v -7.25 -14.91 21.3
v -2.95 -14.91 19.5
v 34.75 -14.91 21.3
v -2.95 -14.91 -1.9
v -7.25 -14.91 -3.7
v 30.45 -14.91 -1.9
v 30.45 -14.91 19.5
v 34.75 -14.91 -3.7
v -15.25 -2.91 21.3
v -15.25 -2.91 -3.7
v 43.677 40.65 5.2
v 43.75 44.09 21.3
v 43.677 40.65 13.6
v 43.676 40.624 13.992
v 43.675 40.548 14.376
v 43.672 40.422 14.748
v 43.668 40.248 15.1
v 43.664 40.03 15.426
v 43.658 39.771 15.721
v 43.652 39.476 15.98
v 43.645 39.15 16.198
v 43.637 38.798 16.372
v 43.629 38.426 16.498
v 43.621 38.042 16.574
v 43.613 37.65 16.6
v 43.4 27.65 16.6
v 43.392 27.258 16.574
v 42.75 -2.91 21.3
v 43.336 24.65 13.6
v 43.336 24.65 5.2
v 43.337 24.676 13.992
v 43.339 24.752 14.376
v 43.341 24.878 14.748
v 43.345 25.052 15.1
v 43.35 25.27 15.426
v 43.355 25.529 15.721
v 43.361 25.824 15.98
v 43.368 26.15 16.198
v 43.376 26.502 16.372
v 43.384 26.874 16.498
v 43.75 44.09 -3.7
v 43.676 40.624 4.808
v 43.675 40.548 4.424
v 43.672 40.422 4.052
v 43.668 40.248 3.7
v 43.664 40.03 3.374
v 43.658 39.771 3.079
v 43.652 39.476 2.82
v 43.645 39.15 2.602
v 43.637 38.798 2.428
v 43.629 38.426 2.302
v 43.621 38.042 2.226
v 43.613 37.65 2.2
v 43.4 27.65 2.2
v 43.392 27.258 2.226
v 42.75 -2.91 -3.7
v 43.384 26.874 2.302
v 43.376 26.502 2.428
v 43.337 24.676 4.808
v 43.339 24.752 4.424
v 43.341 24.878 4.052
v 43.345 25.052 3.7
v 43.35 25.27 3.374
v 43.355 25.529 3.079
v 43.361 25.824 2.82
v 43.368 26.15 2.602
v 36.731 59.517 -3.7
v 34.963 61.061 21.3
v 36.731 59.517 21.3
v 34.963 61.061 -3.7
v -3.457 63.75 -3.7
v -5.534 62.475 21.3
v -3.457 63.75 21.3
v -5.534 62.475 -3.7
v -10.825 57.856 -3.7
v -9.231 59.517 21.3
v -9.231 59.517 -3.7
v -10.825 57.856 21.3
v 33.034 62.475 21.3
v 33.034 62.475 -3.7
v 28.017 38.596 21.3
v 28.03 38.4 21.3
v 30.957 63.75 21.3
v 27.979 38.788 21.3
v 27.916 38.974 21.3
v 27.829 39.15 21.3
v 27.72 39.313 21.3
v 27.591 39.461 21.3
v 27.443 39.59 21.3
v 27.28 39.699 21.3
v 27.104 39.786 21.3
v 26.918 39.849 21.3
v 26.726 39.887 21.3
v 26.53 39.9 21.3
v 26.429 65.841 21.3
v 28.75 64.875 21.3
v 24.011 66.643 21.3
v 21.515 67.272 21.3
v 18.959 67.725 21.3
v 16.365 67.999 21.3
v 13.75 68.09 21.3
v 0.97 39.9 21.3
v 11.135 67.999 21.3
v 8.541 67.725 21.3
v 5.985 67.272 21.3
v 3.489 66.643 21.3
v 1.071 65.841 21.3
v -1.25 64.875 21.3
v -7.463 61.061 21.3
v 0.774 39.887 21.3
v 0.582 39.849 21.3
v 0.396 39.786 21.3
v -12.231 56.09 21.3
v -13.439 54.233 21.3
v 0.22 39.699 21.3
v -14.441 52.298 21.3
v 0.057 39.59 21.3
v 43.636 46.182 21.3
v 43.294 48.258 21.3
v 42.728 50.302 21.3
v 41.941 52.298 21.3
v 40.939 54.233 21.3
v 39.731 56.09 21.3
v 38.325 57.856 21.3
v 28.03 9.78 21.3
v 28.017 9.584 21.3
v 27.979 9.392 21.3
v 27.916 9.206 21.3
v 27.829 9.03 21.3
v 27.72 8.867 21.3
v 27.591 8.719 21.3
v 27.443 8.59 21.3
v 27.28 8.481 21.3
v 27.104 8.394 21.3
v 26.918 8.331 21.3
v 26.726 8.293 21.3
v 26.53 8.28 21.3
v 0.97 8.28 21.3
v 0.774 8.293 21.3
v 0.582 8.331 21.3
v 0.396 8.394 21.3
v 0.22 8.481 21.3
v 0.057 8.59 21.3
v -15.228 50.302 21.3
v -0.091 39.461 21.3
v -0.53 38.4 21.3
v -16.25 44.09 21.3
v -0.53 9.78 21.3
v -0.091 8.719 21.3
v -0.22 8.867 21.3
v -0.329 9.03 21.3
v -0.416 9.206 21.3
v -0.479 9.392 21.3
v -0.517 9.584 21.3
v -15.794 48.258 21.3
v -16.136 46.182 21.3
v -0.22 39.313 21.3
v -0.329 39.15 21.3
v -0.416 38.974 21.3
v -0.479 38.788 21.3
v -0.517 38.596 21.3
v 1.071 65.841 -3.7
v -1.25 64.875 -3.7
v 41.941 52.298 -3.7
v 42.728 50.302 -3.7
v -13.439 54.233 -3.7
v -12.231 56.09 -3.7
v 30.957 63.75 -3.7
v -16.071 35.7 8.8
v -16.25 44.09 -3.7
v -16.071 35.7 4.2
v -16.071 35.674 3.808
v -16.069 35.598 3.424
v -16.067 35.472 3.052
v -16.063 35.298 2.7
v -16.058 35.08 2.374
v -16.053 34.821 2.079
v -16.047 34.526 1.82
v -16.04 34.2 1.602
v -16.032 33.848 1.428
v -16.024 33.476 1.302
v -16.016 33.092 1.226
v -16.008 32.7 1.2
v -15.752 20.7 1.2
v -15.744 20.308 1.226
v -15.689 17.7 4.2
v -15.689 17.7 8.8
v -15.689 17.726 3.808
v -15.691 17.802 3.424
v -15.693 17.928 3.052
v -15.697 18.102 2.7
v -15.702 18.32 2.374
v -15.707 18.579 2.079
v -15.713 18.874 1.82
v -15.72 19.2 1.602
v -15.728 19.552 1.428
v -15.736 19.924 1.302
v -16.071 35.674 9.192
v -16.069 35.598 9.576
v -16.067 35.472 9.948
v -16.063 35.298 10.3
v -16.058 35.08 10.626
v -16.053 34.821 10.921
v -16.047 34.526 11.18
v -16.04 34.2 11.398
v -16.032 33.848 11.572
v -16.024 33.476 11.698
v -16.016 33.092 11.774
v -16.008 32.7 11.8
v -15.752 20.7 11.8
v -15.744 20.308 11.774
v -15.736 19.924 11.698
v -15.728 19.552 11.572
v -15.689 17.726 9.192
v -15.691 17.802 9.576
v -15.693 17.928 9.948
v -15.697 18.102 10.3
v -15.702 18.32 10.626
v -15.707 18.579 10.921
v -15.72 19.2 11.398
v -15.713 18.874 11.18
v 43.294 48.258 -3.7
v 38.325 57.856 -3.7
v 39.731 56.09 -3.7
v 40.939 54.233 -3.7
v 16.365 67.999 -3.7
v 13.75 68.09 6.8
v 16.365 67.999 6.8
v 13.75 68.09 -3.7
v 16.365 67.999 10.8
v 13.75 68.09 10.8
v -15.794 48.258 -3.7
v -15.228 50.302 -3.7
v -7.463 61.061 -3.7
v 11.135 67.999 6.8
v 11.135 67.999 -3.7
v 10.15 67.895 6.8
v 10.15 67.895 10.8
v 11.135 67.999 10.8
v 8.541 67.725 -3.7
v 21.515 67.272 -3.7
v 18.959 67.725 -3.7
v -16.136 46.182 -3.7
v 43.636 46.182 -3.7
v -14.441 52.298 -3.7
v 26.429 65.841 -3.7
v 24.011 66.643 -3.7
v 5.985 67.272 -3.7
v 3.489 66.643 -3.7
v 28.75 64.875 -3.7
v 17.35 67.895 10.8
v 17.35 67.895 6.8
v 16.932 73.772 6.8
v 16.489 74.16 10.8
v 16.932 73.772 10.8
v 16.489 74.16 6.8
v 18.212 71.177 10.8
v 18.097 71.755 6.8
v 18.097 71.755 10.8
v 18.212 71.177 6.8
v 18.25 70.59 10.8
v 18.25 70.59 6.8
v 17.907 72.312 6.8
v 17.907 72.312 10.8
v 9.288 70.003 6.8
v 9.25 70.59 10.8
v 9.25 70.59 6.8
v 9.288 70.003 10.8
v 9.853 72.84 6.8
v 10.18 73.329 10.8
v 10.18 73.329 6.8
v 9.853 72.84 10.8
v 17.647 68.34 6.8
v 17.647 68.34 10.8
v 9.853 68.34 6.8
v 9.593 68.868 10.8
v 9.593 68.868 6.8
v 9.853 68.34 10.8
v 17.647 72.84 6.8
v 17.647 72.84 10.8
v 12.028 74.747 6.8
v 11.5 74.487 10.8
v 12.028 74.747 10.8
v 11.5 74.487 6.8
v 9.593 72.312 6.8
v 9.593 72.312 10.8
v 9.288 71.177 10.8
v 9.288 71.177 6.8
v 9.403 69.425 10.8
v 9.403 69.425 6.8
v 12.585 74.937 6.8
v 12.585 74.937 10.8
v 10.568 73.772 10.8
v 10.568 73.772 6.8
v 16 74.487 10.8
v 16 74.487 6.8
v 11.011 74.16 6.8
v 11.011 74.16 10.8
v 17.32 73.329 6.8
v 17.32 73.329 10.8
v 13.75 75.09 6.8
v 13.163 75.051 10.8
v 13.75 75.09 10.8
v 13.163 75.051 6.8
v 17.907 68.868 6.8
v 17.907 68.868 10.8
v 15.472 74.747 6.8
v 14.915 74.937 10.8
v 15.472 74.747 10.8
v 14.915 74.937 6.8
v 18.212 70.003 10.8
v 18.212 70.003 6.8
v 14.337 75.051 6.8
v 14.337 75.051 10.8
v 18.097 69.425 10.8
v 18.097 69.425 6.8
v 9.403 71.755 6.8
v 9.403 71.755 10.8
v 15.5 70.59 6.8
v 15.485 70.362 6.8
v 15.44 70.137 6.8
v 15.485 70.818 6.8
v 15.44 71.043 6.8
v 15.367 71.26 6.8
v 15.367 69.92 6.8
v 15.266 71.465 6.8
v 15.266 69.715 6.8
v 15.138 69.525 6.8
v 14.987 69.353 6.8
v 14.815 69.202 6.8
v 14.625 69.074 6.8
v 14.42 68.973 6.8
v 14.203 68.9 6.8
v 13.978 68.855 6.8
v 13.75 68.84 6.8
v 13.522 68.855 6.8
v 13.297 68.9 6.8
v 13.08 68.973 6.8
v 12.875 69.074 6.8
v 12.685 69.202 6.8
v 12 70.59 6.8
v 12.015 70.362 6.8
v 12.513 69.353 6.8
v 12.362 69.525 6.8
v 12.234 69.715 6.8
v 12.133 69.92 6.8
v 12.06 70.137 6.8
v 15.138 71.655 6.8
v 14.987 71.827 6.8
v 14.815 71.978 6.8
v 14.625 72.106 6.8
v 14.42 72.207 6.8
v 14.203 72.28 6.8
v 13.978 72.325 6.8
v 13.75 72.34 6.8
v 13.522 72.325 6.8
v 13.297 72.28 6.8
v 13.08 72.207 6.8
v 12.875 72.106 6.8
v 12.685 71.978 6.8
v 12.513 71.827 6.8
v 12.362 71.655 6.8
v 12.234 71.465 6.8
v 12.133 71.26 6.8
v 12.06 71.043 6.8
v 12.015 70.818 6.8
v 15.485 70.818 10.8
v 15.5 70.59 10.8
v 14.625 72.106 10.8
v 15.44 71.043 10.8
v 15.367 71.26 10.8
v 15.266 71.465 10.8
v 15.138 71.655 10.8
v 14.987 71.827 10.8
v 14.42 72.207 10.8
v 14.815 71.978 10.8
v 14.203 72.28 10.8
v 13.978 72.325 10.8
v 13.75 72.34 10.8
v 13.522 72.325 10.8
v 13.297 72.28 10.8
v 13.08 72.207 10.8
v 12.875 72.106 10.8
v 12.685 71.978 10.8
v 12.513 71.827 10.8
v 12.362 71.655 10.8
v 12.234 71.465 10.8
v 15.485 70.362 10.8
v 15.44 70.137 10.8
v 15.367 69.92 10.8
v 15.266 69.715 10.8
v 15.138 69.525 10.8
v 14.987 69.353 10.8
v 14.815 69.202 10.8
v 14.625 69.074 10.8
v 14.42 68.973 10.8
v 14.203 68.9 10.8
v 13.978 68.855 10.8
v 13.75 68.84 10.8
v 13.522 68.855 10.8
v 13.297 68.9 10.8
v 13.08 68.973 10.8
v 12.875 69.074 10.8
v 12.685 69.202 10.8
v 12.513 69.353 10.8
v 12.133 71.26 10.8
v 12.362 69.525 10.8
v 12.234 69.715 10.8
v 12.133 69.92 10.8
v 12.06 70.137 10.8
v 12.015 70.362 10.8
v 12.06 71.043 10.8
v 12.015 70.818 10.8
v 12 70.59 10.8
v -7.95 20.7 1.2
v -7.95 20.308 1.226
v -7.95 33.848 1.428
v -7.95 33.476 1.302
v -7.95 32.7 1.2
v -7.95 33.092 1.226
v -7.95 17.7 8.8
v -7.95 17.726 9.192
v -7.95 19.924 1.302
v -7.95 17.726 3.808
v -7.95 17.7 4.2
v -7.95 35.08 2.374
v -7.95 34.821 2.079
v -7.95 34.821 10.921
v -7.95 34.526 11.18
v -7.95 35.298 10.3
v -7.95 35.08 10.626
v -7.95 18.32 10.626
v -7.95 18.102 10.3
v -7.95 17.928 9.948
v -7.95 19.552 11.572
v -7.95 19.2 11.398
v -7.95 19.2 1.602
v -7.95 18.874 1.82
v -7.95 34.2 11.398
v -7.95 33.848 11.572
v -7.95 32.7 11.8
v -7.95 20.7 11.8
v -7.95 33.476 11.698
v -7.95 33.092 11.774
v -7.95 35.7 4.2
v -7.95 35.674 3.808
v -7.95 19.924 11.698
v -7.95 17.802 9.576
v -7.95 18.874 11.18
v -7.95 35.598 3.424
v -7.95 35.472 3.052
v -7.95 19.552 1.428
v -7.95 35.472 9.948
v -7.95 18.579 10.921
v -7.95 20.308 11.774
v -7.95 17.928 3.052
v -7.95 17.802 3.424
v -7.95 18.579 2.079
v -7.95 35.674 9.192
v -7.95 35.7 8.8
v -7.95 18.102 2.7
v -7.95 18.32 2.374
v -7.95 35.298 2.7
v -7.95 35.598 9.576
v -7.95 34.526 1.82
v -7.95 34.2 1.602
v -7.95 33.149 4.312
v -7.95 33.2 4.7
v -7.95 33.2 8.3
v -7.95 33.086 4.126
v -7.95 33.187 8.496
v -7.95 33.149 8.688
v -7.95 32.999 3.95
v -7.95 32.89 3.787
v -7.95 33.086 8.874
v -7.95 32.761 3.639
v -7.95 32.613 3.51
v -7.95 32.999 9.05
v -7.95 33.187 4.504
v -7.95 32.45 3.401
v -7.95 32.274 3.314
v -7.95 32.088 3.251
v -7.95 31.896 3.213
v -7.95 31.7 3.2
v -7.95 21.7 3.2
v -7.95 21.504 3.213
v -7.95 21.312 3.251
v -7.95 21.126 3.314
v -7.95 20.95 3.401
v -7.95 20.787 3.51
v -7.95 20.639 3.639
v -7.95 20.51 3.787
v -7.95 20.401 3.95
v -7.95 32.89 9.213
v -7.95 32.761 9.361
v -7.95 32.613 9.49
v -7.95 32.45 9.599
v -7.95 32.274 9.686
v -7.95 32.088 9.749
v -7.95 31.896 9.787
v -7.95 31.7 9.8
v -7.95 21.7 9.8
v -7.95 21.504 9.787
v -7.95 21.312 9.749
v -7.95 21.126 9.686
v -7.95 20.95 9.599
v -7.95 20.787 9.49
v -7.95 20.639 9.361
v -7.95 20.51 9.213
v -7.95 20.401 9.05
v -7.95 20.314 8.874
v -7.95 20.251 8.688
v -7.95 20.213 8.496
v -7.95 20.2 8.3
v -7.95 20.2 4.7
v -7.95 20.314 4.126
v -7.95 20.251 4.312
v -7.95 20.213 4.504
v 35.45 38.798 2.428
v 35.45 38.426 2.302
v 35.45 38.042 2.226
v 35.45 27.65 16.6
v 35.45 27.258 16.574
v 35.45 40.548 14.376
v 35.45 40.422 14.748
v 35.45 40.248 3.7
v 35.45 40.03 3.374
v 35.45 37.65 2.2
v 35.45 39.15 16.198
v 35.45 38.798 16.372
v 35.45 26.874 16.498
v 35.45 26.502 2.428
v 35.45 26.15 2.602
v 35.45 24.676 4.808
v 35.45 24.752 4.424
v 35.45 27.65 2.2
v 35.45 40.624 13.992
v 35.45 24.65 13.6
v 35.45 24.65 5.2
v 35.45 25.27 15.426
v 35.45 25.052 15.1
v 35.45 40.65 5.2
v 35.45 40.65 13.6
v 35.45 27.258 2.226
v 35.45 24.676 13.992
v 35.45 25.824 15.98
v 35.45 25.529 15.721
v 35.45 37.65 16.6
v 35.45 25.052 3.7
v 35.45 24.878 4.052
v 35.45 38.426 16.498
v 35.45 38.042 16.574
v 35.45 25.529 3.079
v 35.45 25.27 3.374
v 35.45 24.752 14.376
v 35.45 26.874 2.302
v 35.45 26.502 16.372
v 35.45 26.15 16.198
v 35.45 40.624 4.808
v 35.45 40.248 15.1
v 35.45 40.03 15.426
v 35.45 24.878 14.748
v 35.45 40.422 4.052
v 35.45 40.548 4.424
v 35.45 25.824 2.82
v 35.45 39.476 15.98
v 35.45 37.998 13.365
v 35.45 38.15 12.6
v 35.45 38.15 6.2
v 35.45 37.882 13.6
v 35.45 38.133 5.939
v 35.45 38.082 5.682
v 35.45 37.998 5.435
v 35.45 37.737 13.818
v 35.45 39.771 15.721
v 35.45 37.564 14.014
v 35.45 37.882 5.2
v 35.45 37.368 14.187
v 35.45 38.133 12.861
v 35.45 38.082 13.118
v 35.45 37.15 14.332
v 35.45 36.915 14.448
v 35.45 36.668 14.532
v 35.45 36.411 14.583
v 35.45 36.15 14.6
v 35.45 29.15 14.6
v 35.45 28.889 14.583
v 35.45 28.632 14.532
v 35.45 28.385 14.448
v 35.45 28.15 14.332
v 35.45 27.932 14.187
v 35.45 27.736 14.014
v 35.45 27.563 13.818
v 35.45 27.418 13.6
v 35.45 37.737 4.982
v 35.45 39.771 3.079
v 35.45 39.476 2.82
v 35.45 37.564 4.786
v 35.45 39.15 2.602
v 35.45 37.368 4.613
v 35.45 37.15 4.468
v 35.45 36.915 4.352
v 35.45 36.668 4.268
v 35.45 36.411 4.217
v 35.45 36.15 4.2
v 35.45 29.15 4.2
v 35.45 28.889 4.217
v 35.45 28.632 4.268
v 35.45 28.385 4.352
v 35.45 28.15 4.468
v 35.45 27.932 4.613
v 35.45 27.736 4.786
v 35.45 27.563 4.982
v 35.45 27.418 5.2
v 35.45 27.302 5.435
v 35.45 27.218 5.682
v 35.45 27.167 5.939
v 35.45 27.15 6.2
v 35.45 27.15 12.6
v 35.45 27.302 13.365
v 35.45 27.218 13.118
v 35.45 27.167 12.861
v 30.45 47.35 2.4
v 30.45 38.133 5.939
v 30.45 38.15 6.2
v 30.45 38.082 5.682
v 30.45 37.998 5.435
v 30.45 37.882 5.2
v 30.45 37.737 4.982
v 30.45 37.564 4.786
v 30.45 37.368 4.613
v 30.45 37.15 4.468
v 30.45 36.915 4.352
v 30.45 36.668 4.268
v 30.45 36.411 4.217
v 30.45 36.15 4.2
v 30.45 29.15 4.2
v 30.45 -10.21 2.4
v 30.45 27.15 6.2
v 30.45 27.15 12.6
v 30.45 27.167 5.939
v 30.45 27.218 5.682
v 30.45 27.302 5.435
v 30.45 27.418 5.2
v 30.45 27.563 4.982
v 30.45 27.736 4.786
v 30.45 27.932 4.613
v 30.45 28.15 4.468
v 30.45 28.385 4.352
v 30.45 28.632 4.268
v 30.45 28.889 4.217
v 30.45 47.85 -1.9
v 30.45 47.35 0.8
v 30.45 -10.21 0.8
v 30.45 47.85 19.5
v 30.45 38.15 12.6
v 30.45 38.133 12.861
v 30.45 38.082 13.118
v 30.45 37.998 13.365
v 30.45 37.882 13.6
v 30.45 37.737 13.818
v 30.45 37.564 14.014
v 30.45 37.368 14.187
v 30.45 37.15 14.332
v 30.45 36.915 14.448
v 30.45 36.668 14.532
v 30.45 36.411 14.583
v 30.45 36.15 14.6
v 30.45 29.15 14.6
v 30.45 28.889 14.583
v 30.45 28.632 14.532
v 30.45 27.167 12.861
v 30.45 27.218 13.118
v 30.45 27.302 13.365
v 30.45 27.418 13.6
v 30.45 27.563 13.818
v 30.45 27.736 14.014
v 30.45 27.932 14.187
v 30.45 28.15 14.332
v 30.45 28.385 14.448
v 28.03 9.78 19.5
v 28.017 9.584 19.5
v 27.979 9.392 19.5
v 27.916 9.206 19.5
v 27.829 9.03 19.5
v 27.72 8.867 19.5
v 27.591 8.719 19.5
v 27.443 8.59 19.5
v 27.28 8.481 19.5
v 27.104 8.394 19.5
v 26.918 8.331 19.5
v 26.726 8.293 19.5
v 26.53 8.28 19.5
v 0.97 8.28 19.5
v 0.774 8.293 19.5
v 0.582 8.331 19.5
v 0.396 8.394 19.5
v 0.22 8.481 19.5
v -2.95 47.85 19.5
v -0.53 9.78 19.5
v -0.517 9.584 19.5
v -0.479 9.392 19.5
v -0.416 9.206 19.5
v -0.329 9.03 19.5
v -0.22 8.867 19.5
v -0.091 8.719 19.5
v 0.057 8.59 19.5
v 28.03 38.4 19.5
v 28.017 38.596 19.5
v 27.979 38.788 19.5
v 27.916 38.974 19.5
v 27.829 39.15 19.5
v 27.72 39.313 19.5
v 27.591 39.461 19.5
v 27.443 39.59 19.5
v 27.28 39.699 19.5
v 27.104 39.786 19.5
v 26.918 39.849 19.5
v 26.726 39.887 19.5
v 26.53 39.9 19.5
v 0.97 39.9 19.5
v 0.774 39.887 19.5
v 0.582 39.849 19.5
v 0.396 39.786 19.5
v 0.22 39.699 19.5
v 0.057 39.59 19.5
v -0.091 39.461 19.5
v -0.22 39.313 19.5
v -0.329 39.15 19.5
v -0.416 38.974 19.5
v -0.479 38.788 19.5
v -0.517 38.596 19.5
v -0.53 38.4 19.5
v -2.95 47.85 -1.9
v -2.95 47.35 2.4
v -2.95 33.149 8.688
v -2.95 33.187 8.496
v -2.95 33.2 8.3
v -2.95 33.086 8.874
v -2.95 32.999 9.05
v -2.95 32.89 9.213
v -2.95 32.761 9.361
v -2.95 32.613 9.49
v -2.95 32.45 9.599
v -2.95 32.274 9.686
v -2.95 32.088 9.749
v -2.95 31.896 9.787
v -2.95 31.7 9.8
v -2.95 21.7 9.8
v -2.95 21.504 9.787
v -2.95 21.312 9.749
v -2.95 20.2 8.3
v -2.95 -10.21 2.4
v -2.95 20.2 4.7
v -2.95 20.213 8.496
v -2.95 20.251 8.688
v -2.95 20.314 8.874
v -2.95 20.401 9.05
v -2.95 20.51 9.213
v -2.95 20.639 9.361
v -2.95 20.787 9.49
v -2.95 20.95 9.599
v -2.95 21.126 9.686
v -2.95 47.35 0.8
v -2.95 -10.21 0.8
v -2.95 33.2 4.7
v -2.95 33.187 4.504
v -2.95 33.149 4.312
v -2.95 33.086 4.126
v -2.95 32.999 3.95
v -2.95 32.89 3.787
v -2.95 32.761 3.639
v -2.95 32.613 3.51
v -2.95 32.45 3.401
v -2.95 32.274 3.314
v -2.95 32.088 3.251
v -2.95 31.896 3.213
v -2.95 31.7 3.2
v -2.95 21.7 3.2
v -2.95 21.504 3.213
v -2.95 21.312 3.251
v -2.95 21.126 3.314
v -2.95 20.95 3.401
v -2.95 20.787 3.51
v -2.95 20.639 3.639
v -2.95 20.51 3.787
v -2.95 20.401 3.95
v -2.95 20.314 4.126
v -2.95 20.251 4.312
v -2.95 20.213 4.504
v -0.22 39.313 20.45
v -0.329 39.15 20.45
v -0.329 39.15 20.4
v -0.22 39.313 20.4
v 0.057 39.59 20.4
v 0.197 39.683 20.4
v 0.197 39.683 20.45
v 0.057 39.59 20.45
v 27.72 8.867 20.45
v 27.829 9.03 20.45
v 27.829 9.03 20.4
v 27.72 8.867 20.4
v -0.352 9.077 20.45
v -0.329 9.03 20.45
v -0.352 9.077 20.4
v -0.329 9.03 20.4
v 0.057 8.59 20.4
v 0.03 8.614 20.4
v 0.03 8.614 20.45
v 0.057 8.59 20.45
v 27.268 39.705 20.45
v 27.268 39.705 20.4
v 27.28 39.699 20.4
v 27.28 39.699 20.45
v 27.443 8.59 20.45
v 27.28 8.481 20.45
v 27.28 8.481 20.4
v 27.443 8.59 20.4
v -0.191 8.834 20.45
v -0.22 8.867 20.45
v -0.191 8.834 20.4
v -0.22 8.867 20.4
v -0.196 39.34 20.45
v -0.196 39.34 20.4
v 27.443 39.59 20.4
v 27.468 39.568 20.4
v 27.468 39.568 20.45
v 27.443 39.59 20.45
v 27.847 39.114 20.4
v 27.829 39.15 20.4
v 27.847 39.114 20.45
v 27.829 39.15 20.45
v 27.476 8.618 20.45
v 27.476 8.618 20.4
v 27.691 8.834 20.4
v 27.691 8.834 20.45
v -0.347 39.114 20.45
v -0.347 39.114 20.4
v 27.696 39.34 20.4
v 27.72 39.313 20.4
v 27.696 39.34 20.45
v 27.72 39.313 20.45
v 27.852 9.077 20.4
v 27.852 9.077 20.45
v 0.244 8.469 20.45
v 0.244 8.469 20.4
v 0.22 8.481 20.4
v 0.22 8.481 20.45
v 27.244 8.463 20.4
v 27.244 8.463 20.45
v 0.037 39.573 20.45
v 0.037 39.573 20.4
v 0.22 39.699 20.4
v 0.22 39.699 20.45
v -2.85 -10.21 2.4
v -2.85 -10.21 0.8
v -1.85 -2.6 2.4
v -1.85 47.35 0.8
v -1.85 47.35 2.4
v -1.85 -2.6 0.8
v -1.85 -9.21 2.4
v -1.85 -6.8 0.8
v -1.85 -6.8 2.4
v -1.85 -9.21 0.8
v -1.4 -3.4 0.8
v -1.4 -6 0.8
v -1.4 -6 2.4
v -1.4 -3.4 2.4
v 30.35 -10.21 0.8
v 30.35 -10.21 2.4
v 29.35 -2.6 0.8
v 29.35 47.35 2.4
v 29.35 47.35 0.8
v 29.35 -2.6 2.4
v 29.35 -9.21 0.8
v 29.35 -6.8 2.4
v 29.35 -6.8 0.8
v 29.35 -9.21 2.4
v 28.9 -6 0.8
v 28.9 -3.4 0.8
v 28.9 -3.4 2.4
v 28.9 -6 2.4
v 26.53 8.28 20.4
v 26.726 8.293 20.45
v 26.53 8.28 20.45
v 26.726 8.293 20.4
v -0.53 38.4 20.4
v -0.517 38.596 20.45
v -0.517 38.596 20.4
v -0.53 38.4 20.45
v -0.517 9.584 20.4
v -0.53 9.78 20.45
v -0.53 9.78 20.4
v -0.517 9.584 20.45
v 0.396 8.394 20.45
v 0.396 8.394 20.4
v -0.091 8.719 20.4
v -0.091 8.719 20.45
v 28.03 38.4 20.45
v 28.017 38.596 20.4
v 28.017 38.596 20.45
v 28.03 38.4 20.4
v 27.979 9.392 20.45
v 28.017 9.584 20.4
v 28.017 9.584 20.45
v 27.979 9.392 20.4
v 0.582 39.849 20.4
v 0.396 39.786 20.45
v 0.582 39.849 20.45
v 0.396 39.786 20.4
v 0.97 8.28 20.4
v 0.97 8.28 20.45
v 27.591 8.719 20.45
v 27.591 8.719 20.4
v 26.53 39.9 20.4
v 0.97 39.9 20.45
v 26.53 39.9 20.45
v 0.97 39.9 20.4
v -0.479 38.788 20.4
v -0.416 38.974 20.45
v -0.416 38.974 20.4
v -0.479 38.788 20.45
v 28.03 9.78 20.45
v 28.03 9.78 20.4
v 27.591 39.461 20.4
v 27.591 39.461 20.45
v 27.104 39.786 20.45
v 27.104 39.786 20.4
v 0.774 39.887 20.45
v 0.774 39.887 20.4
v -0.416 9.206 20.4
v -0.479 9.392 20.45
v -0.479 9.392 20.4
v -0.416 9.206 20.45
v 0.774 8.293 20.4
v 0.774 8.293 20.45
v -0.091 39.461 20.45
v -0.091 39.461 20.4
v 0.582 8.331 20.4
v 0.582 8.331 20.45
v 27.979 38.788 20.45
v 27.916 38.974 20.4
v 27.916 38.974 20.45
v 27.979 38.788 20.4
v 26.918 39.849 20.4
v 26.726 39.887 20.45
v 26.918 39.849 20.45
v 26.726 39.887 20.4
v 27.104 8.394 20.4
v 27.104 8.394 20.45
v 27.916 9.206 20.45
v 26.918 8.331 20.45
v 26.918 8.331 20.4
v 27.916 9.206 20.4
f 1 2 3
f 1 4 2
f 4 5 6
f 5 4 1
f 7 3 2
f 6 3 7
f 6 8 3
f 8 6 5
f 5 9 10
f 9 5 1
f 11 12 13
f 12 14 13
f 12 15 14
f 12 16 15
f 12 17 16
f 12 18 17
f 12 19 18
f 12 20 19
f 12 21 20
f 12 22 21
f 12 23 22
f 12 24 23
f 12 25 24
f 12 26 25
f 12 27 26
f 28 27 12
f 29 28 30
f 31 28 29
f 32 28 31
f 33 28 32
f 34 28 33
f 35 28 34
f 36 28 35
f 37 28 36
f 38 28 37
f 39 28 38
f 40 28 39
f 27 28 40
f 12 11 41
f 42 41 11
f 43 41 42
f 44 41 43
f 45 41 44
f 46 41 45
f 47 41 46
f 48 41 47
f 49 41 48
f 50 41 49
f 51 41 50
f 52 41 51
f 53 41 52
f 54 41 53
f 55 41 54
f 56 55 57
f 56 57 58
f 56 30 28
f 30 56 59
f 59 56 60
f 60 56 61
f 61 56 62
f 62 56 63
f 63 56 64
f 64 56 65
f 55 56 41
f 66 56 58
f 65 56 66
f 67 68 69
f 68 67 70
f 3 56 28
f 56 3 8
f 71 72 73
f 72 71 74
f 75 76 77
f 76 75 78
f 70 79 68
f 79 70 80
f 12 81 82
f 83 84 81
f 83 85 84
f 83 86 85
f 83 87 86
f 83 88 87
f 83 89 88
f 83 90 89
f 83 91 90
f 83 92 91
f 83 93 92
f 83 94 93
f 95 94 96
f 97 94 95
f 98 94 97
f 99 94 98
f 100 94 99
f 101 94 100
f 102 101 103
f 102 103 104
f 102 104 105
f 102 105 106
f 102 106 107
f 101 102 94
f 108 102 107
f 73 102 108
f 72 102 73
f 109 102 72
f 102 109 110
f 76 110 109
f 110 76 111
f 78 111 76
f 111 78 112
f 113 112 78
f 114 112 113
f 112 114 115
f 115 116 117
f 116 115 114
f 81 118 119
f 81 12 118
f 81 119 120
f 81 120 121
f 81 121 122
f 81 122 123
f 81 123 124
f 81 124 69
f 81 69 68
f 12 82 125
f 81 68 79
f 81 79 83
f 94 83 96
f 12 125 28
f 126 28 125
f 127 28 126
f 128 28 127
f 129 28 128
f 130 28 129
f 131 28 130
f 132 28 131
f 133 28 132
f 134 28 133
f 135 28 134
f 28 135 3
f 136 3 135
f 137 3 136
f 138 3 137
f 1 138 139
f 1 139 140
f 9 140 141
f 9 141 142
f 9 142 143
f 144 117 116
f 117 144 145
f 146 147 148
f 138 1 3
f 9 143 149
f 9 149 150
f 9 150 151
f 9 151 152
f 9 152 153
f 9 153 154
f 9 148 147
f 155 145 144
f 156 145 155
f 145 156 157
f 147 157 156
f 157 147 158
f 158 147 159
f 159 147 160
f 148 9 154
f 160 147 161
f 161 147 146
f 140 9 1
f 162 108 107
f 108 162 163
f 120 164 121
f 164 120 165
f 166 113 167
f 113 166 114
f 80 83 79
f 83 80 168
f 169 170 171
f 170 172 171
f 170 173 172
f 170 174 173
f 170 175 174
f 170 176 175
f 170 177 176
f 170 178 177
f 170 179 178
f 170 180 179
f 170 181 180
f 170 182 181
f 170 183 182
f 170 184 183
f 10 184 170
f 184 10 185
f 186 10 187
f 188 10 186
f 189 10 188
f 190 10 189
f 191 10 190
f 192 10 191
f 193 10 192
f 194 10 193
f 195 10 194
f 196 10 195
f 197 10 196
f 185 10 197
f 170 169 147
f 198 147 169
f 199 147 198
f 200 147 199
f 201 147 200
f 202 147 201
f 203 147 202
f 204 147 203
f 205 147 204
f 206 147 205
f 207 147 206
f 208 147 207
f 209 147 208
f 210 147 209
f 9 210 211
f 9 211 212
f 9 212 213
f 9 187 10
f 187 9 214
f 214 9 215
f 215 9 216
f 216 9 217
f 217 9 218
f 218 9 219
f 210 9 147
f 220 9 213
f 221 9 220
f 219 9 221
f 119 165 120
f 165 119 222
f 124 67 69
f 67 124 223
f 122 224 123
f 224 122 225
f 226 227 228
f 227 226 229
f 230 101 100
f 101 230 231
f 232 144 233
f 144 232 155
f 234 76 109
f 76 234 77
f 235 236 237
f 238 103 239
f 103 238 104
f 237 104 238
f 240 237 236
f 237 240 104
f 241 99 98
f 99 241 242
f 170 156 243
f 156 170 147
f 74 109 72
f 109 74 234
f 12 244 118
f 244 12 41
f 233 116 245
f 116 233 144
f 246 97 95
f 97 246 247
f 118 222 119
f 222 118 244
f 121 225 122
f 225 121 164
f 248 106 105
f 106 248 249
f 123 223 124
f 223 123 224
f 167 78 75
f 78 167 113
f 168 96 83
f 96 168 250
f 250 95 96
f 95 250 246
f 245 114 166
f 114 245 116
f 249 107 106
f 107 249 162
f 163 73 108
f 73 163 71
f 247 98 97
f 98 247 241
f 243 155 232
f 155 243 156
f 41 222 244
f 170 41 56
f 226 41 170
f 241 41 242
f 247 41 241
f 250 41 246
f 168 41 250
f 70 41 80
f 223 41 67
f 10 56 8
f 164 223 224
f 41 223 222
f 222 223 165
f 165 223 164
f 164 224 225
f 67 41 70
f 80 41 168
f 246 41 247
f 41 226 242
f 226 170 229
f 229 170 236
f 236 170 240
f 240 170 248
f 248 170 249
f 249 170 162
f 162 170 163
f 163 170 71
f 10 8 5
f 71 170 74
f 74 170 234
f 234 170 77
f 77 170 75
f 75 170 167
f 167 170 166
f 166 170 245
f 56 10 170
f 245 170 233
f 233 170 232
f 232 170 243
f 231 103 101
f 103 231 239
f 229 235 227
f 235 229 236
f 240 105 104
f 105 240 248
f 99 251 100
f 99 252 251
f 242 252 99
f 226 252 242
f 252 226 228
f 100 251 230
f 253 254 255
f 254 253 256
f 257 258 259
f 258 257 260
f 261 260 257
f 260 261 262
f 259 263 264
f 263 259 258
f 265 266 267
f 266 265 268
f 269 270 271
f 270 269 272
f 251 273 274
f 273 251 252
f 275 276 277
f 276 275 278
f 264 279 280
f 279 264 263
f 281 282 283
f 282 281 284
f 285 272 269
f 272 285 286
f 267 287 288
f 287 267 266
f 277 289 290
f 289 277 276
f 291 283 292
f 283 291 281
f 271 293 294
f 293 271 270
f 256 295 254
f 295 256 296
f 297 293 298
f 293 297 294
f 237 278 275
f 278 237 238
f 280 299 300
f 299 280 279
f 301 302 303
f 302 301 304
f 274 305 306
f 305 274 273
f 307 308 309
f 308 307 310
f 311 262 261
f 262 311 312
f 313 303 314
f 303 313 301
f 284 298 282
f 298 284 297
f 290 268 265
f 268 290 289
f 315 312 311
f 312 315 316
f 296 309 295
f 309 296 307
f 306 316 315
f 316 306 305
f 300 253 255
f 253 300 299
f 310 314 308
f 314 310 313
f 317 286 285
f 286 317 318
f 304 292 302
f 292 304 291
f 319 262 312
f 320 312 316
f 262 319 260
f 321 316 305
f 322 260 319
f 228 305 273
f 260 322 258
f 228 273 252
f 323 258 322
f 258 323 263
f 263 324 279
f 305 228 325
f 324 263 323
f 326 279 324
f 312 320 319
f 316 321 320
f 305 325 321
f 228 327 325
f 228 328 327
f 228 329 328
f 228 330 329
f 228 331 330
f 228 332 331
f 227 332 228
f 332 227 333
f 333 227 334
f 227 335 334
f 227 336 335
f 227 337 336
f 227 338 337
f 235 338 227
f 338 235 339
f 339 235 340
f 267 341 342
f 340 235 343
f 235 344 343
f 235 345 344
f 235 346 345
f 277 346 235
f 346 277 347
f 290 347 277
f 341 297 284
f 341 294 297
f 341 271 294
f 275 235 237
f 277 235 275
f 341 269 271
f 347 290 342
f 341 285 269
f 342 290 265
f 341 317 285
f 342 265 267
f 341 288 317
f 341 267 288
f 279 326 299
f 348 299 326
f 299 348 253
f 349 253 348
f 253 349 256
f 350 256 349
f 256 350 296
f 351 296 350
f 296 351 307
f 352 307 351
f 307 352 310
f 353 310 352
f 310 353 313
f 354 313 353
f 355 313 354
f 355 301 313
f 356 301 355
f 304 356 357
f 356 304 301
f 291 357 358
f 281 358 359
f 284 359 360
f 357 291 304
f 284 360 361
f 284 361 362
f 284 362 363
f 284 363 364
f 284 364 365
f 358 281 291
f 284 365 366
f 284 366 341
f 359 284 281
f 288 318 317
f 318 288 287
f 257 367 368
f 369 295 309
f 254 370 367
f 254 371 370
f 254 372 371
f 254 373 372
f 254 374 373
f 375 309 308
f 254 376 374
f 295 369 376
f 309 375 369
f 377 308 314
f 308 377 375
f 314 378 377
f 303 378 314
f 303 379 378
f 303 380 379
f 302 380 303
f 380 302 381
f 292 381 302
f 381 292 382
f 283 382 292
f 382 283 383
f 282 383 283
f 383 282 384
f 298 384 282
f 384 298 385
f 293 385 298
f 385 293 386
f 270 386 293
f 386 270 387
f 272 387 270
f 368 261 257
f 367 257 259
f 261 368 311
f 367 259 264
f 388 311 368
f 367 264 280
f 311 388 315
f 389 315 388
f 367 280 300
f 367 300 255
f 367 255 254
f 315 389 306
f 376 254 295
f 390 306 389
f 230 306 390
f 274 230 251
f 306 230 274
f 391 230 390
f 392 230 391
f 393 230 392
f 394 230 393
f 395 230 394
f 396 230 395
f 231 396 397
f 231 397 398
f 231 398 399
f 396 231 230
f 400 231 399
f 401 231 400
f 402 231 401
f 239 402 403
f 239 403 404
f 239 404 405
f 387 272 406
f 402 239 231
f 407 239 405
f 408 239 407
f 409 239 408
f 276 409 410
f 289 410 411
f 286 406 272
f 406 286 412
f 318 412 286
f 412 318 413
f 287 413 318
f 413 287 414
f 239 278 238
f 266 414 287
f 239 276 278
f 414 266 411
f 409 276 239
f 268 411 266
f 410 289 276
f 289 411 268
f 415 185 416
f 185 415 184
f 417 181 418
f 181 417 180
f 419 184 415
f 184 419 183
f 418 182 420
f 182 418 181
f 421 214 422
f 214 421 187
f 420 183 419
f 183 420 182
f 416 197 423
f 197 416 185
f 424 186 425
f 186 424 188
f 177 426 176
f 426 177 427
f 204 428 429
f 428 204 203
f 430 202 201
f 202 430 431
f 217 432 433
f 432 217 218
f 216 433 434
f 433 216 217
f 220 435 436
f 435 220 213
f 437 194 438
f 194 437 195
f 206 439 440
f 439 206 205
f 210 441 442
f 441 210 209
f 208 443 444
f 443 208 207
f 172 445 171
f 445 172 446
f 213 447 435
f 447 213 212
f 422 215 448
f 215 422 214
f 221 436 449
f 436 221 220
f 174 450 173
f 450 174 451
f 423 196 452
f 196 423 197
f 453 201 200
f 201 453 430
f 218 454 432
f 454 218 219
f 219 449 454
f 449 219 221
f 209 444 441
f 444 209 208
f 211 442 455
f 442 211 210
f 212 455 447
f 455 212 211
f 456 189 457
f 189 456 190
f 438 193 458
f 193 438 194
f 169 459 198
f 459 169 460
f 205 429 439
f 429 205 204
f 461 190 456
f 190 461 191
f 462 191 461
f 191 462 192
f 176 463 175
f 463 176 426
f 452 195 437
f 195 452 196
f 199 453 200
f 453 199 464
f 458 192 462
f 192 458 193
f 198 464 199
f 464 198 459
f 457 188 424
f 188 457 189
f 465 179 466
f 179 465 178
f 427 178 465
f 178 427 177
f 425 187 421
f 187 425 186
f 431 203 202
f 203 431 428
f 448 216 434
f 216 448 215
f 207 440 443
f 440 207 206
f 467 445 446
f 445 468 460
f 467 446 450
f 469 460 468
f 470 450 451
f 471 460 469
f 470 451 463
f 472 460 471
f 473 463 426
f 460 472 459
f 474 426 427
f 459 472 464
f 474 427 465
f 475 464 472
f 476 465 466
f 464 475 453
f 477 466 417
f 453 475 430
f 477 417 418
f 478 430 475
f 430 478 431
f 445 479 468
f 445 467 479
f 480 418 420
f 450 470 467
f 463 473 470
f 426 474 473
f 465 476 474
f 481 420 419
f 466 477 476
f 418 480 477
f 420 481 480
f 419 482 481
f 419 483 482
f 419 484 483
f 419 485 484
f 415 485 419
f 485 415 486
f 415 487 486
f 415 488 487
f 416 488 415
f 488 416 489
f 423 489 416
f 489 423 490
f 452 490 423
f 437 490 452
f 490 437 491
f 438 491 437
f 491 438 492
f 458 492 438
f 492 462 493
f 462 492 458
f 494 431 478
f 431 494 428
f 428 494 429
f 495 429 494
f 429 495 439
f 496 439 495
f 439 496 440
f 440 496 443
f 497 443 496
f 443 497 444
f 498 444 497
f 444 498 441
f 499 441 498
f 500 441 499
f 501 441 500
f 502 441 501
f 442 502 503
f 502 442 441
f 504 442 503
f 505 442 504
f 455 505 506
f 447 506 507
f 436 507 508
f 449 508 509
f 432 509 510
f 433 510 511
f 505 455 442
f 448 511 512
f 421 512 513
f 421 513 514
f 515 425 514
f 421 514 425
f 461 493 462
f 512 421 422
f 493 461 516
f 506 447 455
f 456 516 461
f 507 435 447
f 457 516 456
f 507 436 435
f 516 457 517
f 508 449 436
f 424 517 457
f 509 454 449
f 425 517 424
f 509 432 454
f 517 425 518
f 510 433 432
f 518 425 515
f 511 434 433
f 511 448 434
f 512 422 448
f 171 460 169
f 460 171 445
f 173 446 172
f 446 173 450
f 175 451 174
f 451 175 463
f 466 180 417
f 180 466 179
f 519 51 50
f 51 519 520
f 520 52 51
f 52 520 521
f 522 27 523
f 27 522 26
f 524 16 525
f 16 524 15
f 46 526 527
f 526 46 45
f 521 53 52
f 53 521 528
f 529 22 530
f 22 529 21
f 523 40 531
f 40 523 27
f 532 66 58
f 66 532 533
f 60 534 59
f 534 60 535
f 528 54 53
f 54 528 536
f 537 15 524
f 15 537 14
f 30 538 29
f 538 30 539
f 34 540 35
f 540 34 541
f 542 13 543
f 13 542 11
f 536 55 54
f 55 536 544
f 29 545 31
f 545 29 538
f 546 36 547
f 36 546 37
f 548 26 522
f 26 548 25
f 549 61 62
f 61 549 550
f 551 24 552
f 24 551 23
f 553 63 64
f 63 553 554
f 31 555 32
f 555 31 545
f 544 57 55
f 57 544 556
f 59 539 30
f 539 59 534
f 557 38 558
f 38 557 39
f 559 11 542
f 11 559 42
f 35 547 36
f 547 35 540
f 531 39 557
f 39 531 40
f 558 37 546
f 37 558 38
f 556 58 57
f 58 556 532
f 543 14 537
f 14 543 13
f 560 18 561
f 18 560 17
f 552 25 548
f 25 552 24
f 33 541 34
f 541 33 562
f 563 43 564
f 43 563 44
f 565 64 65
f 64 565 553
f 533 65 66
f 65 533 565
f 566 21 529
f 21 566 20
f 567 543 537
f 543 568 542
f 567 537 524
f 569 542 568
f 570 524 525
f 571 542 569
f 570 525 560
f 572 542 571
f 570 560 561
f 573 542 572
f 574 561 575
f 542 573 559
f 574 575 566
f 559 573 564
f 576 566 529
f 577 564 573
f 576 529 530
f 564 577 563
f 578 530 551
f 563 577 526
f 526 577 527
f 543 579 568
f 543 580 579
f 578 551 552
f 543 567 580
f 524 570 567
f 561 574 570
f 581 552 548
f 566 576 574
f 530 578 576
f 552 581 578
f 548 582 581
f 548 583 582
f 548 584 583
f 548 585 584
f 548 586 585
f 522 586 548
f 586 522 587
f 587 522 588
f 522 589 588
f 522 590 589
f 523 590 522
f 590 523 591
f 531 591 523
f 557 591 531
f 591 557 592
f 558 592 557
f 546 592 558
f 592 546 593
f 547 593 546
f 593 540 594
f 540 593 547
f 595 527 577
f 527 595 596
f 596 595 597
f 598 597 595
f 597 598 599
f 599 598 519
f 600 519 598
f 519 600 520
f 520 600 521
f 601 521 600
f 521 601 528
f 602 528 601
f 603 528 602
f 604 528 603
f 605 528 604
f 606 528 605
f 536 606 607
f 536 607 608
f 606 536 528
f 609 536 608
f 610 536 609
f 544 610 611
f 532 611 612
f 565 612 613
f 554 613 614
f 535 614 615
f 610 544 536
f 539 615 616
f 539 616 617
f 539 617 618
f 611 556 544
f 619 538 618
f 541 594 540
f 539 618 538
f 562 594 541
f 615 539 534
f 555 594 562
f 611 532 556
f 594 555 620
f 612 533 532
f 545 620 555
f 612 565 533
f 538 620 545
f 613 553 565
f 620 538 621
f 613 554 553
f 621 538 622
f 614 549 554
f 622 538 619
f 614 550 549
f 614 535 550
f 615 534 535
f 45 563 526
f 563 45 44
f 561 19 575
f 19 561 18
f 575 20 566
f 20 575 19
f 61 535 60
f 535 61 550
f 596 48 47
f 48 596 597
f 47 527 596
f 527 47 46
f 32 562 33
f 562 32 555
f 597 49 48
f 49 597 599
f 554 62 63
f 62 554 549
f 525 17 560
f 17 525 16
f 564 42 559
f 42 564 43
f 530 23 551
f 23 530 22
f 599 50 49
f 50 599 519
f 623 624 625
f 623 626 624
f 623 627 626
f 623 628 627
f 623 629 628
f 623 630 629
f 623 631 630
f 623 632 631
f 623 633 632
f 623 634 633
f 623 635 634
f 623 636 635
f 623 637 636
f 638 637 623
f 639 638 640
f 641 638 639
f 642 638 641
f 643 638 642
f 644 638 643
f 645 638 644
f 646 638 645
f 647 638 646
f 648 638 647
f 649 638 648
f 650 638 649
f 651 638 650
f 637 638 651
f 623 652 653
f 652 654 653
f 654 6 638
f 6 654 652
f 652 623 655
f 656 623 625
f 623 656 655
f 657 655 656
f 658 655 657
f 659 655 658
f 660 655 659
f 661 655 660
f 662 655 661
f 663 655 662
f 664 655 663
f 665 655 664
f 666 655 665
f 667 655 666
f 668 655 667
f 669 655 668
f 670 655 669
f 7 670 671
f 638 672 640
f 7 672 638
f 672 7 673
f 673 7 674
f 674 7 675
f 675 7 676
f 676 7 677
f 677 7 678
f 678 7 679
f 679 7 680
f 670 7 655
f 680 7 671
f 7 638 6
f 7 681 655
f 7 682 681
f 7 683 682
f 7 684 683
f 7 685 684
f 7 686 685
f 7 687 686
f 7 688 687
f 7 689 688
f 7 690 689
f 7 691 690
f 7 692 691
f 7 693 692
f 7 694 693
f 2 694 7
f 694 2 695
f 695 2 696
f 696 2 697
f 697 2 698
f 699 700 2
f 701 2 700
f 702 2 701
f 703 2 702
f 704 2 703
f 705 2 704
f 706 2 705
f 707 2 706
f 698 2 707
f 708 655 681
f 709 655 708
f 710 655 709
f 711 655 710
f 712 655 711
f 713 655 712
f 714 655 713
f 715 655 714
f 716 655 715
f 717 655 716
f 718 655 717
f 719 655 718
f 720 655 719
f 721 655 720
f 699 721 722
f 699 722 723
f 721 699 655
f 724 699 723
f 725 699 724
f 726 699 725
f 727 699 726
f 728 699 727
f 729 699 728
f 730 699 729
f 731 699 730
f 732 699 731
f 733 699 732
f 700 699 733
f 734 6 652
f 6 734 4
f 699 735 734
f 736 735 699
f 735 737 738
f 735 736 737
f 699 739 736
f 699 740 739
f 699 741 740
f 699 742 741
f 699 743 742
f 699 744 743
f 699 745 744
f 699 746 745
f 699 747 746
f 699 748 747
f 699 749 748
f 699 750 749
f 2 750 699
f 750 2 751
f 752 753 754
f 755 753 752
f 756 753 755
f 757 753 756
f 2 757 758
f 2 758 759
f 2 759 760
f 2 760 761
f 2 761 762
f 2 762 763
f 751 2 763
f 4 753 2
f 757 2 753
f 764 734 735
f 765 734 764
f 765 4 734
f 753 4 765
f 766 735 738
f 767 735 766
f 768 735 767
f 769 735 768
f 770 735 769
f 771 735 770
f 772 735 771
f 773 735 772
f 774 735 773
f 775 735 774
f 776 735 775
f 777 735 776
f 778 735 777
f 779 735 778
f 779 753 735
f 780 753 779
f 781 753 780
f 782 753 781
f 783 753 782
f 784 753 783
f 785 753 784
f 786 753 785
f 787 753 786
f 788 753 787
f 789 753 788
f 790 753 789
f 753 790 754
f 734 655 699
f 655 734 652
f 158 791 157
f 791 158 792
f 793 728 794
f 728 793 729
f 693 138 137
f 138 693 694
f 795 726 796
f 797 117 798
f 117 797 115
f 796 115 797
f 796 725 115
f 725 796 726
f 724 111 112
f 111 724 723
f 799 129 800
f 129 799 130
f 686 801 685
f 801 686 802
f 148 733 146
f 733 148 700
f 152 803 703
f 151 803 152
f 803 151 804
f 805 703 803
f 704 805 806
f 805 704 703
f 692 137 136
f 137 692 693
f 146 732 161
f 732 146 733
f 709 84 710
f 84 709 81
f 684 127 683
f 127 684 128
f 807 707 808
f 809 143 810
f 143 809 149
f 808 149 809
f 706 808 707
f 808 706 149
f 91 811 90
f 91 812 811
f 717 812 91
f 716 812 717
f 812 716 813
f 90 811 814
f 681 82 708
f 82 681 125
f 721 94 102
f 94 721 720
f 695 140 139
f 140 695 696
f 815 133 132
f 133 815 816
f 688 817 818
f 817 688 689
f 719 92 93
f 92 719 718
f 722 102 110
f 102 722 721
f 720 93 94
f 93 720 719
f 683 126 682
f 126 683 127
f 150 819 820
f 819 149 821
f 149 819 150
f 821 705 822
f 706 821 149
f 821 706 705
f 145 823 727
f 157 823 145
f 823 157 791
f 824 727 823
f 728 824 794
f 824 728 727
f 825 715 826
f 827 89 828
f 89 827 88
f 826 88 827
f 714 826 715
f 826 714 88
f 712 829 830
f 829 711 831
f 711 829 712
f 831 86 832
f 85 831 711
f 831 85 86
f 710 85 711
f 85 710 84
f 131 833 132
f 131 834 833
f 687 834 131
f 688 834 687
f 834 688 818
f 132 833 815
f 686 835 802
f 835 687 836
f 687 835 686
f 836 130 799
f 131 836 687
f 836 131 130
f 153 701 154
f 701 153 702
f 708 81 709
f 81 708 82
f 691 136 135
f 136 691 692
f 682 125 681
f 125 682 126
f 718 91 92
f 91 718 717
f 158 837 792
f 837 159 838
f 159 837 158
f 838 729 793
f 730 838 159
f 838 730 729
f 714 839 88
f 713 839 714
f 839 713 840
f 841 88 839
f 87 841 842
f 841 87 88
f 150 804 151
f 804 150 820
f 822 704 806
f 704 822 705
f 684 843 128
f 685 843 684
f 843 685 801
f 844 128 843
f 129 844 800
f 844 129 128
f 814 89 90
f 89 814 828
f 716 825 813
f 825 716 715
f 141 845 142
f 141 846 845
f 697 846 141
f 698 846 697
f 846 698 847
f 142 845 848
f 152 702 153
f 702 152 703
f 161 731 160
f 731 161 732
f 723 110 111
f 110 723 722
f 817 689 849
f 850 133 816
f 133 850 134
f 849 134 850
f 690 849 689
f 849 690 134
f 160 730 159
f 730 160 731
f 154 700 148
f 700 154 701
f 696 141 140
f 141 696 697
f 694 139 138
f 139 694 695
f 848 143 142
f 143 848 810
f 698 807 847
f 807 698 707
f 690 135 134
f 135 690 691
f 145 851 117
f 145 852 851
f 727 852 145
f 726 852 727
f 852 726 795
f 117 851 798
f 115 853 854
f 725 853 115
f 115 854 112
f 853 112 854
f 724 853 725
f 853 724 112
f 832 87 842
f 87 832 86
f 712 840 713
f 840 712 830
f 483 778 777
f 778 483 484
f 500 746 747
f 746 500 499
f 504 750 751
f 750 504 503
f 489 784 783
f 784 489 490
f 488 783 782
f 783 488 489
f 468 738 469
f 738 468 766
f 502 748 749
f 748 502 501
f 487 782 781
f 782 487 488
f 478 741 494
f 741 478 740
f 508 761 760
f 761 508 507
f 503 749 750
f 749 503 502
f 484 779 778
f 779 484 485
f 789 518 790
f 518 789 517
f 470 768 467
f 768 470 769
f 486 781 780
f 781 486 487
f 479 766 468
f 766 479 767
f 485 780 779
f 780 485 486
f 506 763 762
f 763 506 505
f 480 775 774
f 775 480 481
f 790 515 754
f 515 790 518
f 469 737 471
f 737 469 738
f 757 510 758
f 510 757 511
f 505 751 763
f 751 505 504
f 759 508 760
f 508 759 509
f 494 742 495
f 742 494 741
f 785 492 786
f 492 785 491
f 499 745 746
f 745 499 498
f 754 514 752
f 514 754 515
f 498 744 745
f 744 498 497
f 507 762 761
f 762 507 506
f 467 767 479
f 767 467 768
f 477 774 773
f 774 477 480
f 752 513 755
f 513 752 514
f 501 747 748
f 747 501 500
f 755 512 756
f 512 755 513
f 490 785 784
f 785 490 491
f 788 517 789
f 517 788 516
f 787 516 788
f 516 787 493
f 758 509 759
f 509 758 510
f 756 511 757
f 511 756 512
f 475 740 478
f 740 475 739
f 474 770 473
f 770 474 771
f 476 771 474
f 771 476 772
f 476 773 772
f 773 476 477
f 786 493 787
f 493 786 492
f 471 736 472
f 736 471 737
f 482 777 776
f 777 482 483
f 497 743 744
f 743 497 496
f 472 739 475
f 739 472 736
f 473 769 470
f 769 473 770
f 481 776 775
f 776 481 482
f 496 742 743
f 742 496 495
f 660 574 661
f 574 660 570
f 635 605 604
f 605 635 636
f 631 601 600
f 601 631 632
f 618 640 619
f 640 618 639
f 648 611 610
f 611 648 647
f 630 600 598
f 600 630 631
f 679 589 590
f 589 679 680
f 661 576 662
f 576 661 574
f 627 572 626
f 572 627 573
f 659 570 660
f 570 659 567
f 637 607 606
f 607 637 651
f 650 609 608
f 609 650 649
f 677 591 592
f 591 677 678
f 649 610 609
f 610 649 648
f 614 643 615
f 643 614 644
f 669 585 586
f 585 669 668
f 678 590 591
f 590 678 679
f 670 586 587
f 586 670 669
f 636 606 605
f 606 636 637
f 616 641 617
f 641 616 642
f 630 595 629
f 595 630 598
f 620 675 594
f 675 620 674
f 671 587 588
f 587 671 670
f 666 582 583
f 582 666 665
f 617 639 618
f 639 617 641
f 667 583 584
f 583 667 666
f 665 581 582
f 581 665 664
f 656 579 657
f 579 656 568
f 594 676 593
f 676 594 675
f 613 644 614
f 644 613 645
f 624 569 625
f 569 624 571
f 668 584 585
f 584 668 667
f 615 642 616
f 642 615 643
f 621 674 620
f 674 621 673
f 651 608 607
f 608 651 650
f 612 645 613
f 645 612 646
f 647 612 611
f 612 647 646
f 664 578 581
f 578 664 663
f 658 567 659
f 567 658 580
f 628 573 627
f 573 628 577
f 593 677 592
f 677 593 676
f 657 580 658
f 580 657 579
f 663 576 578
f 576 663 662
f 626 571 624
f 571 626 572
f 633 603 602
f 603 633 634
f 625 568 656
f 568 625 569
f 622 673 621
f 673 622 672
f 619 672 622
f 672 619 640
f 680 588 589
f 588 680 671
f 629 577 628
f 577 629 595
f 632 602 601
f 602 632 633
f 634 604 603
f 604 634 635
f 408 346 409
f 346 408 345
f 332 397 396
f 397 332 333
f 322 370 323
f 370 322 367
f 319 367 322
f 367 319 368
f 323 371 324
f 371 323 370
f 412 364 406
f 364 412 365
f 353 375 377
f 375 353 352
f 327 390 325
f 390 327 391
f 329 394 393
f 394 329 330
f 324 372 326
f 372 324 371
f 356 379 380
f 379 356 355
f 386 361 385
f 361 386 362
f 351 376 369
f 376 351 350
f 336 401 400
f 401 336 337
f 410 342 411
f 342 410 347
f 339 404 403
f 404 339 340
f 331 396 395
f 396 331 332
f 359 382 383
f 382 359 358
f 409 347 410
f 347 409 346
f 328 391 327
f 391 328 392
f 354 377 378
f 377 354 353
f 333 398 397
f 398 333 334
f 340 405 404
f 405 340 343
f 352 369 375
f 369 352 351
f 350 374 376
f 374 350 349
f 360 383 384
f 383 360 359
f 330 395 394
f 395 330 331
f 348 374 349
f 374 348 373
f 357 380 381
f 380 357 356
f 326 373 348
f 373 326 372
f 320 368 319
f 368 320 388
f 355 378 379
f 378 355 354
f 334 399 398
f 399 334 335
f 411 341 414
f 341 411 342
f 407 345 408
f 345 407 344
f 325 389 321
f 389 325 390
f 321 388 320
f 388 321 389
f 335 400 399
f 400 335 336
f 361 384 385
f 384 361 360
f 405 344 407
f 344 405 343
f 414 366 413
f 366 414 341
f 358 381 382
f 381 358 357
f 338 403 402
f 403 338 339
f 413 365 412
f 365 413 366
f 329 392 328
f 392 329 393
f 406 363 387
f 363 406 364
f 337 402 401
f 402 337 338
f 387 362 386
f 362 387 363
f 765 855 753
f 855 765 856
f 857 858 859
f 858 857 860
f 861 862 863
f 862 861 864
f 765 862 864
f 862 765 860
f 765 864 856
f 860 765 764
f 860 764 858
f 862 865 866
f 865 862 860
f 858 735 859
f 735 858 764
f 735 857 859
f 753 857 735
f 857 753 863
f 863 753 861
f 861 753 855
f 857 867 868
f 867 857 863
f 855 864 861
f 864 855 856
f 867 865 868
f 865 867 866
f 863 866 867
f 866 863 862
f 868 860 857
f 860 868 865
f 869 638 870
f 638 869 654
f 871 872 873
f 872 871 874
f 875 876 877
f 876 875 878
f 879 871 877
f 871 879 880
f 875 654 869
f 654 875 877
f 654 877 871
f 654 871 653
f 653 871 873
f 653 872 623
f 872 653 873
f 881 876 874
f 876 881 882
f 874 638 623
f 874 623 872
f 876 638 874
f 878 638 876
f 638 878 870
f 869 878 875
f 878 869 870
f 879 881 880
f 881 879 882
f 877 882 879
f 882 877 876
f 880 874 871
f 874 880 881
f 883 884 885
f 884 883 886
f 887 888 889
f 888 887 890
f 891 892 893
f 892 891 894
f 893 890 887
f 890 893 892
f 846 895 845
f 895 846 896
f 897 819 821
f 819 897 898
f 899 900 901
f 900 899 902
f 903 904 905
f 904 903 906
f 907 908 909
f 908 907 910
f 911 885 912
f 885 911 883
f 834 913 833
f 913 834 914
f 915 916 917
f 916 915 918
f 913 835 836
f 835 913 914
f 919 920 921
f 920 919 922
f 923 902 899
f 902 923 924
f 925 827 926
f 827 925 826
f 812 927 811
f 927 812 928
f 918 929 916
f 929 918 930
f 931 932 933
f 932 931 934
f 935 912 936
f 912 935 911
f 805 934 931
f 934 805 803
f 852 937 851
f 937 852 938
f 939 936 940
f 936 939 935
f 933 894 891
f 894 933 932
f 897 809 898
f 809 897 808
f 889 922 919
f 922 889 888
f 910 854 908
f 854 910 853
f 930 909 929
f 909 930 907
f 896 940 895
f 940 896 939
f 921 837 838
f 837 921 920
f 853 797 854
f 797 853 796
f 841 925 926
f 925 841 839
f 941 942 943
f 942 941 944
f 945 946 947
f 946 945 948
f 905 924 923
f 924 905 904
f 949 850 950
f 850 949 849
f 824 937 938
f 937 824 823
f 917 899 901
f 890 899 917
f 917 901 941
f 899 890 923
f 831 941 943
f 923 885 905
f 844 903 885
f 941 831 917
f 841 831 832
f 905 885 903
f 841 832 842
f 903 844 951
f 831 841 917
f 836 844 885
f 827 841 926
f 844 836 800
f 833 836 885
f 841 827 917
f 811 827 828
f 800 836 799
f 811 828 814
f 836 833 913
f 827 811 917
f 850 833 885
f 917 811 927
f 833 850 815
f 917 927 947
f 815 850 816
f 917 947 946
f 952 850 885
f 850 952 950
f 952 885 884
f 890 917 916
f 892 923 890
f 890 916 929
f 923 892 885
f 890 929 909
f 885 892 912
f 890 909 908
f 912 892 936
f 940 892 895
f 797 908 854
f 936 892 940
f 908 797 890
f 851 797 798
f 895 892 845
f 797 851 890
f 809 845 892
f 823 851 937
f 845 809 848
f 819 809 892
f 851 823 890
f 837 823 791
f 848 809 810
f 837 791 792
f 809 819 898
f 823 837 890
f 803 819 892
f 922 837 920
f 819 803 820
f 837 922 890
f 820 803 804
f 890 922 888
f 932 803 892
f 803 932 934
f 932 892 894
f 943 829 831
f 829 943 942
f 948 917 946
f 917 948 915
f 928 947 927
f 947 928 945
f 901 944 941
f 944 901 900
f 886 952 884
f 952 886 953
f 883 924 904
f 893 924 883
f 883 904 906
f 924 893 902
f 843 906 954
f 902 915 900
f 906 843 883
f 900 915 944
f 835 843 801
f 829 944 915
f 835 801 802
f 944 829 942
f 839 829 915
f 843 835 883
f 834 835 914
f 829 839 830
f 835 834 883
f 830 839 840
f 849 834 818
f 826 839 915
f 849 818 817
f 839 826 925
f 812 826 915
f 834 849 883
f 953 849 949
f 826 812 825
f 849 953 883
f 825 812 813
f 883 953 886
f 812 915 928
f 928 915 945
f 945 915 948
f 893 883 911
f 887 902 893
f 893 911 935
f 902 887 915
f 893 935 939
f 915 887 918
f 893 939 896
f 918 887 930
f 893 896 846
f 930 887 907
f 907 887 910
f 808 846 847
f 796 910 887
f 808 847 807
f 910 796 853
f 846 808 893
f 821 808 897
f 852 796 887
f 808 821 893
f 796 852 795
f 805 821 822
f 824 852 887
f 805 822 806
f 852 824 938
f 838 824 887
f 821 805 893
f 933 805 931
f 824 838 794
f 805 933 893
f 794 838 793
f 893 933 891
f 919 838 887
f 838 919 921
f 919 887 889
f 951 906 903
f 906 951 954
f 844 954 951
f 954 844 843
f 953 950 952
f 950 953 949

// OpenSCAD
// file: xmas_orn_case.scad
// Forward archived designs to the unchanged shared core one directory above.
include <../xmas_orn_case.scad>
// main file
// Iron Man revision 4: simplified 2008 Mark III helmet.
// Narrow horizontal lenses, broad faceplate, plain red shell; no bust or facial linework.
// V1-V3 remain untouched. Mechanical interface comes from the common core.
// part: ironman_v4 | body/gold/black/white[_print] | check_core/colours/backing
include <xmas_orn_case.scad>
part = "ironman_v4";
preview_display = true;
im_cx = (glass_x0 + glass_x1)/2;
im_cy = (glass_y0 + glass_y1)/2 - 4;
im_bottom = -35;
im_top = 48;
im_inlay = 0.8;
im_names = ["body", "gold", "black", "white"];
im_colours = ["#a51c2c", "#d9ae57", "#171b23", "#e9faff"];

module im_pair() { children(); mirror([1,0,0]) children(); }
module im_window() translate([0,4]) offset(r = 1.5)
    square([glass_w+2*front_win_margin-3, glass_l+2*front_win_margin-3], center = true);
module im_outline() polygon(concat(
    [for (a = [0:5:180]) [30*cos(a),24+24*sin(a)]],
    [[-29,-23],[-21,-35],[21,-35],[29,-23]]));

// The forehead notch and cut-back cheek plates define the helmet without drawn features.
module im_faceplate() polygon([
    [-6,44],[-5,38],[5,38],[6,44],[13,42],[21,37],[25,30],
    [26,12],[25,3],[21,-6],[18,-20],[16,-26],[12,-21],
    [-12,-21],[-16,-26],[-18,-20],[-21,-6],[-25,3],[-26,12],
    [-25,30],[-21,37],[-13,42]]);
module im_eyes() im_pair() polygon([
    [-24,27.4],[-6,27.4],[-7,25.2],[-23.4,24.8]]);
module im_gold() {
    im_faceplate();
    // Separate lower jaw plate, with the small red centre notch of the early helmet.
    polygon([[-18,-27],[-16,-27.2],[-11.5,-22.2],[11.5,-22.2],[16,-27.2],[18,-27],
             [20,-30],[16,-33],[11,-28],[4,-27],[3,-24.8],[-3,-24.8],
             [-4,-27],[-11,-28],[-16,-33],[-20,-30]]);
}
module im_black() {
    offset(delta = 0.65) im_eyes();
    // One plate separation, not a drawn mouth or multiple facial creases.
    polygon([[-16,-26],[-12,-21],[12,-21],[16,-26],
             [16,-27.2],[11.5,-22.2],[-11.5,-22.2],[-16,-27.2]]);
}
module im_white() im_eyes();

module im_raw(c) {
    if (c == 1) im_gold();
    if (c == 2) im_black();
    if (c == 3) im_white();
}
module im_ink(c) difference() {
    intersection() { im_outline(); im_raw(c); }
    if (c < 3) for (k = [c+1:3]) im_raw(k);
}
module im_body() {
    difference() {
        union() {
            translate([im_cx,im_cy,sz0]) linear_extrude(sz1-sz0) im_outline();
            hang_loop(im_cx,im_cy+im_top);
        }
        hang_loop_hole(im_cx,im_cy+im_top);
        sleeve_cuts(ext = 40, finger = true);
        translate([im_cx,im_cy,sz1-im_inlay]) linear_extrude(im_inlay+eps)
            for (c = [1:3]) im_raw(c);
    }
    sleeve_rails();
}
module im_colour(c) difference() {
    translate([im_cx,im_cy,sz1-im_inlay]) linear_extrude(im_inlay) im_ink(c);
    sleeve_cuts(ext = 40, finger = true);
}
module im_piece(c) { if (c == 0) im_body(); else im_colour(c); }
module im_solid() union() for (c = [0:3]) im_piece(c);
module im_stand() translate([0,0,-(im_cy+im_bottom)]) rotate([90,0,0]) children();

if (part == "ironman_v4") {
    for (c = [0:3]) color(im_colours[c]) render() im_piece(c);
    if (preview_display) color("#101a25") translate([im_cx,im_cy,sz1-im_inlay-0.1])
        linear_extrude(0.05) im_window();
}
for (c = [0:3]) {
    if (part == im_names[c]) im_piece(c);
    if (part == str(im_names[c],"_print")) im_stand() im_piece(c);
}
if (part == "check_core") intersection() { im_solid(); union() { core_tray(); core_bezel(); } }
if (part == "check_colours") for (a = [0:2], b = [a+1:3])
    intersection() { im_piece(a); im_piece(b); }
if (part == "check_backing") difference() {
    translate([0,0,-im_inlay]) union() for (c = [1:3]) im_colour(c);
    im_body();
}
